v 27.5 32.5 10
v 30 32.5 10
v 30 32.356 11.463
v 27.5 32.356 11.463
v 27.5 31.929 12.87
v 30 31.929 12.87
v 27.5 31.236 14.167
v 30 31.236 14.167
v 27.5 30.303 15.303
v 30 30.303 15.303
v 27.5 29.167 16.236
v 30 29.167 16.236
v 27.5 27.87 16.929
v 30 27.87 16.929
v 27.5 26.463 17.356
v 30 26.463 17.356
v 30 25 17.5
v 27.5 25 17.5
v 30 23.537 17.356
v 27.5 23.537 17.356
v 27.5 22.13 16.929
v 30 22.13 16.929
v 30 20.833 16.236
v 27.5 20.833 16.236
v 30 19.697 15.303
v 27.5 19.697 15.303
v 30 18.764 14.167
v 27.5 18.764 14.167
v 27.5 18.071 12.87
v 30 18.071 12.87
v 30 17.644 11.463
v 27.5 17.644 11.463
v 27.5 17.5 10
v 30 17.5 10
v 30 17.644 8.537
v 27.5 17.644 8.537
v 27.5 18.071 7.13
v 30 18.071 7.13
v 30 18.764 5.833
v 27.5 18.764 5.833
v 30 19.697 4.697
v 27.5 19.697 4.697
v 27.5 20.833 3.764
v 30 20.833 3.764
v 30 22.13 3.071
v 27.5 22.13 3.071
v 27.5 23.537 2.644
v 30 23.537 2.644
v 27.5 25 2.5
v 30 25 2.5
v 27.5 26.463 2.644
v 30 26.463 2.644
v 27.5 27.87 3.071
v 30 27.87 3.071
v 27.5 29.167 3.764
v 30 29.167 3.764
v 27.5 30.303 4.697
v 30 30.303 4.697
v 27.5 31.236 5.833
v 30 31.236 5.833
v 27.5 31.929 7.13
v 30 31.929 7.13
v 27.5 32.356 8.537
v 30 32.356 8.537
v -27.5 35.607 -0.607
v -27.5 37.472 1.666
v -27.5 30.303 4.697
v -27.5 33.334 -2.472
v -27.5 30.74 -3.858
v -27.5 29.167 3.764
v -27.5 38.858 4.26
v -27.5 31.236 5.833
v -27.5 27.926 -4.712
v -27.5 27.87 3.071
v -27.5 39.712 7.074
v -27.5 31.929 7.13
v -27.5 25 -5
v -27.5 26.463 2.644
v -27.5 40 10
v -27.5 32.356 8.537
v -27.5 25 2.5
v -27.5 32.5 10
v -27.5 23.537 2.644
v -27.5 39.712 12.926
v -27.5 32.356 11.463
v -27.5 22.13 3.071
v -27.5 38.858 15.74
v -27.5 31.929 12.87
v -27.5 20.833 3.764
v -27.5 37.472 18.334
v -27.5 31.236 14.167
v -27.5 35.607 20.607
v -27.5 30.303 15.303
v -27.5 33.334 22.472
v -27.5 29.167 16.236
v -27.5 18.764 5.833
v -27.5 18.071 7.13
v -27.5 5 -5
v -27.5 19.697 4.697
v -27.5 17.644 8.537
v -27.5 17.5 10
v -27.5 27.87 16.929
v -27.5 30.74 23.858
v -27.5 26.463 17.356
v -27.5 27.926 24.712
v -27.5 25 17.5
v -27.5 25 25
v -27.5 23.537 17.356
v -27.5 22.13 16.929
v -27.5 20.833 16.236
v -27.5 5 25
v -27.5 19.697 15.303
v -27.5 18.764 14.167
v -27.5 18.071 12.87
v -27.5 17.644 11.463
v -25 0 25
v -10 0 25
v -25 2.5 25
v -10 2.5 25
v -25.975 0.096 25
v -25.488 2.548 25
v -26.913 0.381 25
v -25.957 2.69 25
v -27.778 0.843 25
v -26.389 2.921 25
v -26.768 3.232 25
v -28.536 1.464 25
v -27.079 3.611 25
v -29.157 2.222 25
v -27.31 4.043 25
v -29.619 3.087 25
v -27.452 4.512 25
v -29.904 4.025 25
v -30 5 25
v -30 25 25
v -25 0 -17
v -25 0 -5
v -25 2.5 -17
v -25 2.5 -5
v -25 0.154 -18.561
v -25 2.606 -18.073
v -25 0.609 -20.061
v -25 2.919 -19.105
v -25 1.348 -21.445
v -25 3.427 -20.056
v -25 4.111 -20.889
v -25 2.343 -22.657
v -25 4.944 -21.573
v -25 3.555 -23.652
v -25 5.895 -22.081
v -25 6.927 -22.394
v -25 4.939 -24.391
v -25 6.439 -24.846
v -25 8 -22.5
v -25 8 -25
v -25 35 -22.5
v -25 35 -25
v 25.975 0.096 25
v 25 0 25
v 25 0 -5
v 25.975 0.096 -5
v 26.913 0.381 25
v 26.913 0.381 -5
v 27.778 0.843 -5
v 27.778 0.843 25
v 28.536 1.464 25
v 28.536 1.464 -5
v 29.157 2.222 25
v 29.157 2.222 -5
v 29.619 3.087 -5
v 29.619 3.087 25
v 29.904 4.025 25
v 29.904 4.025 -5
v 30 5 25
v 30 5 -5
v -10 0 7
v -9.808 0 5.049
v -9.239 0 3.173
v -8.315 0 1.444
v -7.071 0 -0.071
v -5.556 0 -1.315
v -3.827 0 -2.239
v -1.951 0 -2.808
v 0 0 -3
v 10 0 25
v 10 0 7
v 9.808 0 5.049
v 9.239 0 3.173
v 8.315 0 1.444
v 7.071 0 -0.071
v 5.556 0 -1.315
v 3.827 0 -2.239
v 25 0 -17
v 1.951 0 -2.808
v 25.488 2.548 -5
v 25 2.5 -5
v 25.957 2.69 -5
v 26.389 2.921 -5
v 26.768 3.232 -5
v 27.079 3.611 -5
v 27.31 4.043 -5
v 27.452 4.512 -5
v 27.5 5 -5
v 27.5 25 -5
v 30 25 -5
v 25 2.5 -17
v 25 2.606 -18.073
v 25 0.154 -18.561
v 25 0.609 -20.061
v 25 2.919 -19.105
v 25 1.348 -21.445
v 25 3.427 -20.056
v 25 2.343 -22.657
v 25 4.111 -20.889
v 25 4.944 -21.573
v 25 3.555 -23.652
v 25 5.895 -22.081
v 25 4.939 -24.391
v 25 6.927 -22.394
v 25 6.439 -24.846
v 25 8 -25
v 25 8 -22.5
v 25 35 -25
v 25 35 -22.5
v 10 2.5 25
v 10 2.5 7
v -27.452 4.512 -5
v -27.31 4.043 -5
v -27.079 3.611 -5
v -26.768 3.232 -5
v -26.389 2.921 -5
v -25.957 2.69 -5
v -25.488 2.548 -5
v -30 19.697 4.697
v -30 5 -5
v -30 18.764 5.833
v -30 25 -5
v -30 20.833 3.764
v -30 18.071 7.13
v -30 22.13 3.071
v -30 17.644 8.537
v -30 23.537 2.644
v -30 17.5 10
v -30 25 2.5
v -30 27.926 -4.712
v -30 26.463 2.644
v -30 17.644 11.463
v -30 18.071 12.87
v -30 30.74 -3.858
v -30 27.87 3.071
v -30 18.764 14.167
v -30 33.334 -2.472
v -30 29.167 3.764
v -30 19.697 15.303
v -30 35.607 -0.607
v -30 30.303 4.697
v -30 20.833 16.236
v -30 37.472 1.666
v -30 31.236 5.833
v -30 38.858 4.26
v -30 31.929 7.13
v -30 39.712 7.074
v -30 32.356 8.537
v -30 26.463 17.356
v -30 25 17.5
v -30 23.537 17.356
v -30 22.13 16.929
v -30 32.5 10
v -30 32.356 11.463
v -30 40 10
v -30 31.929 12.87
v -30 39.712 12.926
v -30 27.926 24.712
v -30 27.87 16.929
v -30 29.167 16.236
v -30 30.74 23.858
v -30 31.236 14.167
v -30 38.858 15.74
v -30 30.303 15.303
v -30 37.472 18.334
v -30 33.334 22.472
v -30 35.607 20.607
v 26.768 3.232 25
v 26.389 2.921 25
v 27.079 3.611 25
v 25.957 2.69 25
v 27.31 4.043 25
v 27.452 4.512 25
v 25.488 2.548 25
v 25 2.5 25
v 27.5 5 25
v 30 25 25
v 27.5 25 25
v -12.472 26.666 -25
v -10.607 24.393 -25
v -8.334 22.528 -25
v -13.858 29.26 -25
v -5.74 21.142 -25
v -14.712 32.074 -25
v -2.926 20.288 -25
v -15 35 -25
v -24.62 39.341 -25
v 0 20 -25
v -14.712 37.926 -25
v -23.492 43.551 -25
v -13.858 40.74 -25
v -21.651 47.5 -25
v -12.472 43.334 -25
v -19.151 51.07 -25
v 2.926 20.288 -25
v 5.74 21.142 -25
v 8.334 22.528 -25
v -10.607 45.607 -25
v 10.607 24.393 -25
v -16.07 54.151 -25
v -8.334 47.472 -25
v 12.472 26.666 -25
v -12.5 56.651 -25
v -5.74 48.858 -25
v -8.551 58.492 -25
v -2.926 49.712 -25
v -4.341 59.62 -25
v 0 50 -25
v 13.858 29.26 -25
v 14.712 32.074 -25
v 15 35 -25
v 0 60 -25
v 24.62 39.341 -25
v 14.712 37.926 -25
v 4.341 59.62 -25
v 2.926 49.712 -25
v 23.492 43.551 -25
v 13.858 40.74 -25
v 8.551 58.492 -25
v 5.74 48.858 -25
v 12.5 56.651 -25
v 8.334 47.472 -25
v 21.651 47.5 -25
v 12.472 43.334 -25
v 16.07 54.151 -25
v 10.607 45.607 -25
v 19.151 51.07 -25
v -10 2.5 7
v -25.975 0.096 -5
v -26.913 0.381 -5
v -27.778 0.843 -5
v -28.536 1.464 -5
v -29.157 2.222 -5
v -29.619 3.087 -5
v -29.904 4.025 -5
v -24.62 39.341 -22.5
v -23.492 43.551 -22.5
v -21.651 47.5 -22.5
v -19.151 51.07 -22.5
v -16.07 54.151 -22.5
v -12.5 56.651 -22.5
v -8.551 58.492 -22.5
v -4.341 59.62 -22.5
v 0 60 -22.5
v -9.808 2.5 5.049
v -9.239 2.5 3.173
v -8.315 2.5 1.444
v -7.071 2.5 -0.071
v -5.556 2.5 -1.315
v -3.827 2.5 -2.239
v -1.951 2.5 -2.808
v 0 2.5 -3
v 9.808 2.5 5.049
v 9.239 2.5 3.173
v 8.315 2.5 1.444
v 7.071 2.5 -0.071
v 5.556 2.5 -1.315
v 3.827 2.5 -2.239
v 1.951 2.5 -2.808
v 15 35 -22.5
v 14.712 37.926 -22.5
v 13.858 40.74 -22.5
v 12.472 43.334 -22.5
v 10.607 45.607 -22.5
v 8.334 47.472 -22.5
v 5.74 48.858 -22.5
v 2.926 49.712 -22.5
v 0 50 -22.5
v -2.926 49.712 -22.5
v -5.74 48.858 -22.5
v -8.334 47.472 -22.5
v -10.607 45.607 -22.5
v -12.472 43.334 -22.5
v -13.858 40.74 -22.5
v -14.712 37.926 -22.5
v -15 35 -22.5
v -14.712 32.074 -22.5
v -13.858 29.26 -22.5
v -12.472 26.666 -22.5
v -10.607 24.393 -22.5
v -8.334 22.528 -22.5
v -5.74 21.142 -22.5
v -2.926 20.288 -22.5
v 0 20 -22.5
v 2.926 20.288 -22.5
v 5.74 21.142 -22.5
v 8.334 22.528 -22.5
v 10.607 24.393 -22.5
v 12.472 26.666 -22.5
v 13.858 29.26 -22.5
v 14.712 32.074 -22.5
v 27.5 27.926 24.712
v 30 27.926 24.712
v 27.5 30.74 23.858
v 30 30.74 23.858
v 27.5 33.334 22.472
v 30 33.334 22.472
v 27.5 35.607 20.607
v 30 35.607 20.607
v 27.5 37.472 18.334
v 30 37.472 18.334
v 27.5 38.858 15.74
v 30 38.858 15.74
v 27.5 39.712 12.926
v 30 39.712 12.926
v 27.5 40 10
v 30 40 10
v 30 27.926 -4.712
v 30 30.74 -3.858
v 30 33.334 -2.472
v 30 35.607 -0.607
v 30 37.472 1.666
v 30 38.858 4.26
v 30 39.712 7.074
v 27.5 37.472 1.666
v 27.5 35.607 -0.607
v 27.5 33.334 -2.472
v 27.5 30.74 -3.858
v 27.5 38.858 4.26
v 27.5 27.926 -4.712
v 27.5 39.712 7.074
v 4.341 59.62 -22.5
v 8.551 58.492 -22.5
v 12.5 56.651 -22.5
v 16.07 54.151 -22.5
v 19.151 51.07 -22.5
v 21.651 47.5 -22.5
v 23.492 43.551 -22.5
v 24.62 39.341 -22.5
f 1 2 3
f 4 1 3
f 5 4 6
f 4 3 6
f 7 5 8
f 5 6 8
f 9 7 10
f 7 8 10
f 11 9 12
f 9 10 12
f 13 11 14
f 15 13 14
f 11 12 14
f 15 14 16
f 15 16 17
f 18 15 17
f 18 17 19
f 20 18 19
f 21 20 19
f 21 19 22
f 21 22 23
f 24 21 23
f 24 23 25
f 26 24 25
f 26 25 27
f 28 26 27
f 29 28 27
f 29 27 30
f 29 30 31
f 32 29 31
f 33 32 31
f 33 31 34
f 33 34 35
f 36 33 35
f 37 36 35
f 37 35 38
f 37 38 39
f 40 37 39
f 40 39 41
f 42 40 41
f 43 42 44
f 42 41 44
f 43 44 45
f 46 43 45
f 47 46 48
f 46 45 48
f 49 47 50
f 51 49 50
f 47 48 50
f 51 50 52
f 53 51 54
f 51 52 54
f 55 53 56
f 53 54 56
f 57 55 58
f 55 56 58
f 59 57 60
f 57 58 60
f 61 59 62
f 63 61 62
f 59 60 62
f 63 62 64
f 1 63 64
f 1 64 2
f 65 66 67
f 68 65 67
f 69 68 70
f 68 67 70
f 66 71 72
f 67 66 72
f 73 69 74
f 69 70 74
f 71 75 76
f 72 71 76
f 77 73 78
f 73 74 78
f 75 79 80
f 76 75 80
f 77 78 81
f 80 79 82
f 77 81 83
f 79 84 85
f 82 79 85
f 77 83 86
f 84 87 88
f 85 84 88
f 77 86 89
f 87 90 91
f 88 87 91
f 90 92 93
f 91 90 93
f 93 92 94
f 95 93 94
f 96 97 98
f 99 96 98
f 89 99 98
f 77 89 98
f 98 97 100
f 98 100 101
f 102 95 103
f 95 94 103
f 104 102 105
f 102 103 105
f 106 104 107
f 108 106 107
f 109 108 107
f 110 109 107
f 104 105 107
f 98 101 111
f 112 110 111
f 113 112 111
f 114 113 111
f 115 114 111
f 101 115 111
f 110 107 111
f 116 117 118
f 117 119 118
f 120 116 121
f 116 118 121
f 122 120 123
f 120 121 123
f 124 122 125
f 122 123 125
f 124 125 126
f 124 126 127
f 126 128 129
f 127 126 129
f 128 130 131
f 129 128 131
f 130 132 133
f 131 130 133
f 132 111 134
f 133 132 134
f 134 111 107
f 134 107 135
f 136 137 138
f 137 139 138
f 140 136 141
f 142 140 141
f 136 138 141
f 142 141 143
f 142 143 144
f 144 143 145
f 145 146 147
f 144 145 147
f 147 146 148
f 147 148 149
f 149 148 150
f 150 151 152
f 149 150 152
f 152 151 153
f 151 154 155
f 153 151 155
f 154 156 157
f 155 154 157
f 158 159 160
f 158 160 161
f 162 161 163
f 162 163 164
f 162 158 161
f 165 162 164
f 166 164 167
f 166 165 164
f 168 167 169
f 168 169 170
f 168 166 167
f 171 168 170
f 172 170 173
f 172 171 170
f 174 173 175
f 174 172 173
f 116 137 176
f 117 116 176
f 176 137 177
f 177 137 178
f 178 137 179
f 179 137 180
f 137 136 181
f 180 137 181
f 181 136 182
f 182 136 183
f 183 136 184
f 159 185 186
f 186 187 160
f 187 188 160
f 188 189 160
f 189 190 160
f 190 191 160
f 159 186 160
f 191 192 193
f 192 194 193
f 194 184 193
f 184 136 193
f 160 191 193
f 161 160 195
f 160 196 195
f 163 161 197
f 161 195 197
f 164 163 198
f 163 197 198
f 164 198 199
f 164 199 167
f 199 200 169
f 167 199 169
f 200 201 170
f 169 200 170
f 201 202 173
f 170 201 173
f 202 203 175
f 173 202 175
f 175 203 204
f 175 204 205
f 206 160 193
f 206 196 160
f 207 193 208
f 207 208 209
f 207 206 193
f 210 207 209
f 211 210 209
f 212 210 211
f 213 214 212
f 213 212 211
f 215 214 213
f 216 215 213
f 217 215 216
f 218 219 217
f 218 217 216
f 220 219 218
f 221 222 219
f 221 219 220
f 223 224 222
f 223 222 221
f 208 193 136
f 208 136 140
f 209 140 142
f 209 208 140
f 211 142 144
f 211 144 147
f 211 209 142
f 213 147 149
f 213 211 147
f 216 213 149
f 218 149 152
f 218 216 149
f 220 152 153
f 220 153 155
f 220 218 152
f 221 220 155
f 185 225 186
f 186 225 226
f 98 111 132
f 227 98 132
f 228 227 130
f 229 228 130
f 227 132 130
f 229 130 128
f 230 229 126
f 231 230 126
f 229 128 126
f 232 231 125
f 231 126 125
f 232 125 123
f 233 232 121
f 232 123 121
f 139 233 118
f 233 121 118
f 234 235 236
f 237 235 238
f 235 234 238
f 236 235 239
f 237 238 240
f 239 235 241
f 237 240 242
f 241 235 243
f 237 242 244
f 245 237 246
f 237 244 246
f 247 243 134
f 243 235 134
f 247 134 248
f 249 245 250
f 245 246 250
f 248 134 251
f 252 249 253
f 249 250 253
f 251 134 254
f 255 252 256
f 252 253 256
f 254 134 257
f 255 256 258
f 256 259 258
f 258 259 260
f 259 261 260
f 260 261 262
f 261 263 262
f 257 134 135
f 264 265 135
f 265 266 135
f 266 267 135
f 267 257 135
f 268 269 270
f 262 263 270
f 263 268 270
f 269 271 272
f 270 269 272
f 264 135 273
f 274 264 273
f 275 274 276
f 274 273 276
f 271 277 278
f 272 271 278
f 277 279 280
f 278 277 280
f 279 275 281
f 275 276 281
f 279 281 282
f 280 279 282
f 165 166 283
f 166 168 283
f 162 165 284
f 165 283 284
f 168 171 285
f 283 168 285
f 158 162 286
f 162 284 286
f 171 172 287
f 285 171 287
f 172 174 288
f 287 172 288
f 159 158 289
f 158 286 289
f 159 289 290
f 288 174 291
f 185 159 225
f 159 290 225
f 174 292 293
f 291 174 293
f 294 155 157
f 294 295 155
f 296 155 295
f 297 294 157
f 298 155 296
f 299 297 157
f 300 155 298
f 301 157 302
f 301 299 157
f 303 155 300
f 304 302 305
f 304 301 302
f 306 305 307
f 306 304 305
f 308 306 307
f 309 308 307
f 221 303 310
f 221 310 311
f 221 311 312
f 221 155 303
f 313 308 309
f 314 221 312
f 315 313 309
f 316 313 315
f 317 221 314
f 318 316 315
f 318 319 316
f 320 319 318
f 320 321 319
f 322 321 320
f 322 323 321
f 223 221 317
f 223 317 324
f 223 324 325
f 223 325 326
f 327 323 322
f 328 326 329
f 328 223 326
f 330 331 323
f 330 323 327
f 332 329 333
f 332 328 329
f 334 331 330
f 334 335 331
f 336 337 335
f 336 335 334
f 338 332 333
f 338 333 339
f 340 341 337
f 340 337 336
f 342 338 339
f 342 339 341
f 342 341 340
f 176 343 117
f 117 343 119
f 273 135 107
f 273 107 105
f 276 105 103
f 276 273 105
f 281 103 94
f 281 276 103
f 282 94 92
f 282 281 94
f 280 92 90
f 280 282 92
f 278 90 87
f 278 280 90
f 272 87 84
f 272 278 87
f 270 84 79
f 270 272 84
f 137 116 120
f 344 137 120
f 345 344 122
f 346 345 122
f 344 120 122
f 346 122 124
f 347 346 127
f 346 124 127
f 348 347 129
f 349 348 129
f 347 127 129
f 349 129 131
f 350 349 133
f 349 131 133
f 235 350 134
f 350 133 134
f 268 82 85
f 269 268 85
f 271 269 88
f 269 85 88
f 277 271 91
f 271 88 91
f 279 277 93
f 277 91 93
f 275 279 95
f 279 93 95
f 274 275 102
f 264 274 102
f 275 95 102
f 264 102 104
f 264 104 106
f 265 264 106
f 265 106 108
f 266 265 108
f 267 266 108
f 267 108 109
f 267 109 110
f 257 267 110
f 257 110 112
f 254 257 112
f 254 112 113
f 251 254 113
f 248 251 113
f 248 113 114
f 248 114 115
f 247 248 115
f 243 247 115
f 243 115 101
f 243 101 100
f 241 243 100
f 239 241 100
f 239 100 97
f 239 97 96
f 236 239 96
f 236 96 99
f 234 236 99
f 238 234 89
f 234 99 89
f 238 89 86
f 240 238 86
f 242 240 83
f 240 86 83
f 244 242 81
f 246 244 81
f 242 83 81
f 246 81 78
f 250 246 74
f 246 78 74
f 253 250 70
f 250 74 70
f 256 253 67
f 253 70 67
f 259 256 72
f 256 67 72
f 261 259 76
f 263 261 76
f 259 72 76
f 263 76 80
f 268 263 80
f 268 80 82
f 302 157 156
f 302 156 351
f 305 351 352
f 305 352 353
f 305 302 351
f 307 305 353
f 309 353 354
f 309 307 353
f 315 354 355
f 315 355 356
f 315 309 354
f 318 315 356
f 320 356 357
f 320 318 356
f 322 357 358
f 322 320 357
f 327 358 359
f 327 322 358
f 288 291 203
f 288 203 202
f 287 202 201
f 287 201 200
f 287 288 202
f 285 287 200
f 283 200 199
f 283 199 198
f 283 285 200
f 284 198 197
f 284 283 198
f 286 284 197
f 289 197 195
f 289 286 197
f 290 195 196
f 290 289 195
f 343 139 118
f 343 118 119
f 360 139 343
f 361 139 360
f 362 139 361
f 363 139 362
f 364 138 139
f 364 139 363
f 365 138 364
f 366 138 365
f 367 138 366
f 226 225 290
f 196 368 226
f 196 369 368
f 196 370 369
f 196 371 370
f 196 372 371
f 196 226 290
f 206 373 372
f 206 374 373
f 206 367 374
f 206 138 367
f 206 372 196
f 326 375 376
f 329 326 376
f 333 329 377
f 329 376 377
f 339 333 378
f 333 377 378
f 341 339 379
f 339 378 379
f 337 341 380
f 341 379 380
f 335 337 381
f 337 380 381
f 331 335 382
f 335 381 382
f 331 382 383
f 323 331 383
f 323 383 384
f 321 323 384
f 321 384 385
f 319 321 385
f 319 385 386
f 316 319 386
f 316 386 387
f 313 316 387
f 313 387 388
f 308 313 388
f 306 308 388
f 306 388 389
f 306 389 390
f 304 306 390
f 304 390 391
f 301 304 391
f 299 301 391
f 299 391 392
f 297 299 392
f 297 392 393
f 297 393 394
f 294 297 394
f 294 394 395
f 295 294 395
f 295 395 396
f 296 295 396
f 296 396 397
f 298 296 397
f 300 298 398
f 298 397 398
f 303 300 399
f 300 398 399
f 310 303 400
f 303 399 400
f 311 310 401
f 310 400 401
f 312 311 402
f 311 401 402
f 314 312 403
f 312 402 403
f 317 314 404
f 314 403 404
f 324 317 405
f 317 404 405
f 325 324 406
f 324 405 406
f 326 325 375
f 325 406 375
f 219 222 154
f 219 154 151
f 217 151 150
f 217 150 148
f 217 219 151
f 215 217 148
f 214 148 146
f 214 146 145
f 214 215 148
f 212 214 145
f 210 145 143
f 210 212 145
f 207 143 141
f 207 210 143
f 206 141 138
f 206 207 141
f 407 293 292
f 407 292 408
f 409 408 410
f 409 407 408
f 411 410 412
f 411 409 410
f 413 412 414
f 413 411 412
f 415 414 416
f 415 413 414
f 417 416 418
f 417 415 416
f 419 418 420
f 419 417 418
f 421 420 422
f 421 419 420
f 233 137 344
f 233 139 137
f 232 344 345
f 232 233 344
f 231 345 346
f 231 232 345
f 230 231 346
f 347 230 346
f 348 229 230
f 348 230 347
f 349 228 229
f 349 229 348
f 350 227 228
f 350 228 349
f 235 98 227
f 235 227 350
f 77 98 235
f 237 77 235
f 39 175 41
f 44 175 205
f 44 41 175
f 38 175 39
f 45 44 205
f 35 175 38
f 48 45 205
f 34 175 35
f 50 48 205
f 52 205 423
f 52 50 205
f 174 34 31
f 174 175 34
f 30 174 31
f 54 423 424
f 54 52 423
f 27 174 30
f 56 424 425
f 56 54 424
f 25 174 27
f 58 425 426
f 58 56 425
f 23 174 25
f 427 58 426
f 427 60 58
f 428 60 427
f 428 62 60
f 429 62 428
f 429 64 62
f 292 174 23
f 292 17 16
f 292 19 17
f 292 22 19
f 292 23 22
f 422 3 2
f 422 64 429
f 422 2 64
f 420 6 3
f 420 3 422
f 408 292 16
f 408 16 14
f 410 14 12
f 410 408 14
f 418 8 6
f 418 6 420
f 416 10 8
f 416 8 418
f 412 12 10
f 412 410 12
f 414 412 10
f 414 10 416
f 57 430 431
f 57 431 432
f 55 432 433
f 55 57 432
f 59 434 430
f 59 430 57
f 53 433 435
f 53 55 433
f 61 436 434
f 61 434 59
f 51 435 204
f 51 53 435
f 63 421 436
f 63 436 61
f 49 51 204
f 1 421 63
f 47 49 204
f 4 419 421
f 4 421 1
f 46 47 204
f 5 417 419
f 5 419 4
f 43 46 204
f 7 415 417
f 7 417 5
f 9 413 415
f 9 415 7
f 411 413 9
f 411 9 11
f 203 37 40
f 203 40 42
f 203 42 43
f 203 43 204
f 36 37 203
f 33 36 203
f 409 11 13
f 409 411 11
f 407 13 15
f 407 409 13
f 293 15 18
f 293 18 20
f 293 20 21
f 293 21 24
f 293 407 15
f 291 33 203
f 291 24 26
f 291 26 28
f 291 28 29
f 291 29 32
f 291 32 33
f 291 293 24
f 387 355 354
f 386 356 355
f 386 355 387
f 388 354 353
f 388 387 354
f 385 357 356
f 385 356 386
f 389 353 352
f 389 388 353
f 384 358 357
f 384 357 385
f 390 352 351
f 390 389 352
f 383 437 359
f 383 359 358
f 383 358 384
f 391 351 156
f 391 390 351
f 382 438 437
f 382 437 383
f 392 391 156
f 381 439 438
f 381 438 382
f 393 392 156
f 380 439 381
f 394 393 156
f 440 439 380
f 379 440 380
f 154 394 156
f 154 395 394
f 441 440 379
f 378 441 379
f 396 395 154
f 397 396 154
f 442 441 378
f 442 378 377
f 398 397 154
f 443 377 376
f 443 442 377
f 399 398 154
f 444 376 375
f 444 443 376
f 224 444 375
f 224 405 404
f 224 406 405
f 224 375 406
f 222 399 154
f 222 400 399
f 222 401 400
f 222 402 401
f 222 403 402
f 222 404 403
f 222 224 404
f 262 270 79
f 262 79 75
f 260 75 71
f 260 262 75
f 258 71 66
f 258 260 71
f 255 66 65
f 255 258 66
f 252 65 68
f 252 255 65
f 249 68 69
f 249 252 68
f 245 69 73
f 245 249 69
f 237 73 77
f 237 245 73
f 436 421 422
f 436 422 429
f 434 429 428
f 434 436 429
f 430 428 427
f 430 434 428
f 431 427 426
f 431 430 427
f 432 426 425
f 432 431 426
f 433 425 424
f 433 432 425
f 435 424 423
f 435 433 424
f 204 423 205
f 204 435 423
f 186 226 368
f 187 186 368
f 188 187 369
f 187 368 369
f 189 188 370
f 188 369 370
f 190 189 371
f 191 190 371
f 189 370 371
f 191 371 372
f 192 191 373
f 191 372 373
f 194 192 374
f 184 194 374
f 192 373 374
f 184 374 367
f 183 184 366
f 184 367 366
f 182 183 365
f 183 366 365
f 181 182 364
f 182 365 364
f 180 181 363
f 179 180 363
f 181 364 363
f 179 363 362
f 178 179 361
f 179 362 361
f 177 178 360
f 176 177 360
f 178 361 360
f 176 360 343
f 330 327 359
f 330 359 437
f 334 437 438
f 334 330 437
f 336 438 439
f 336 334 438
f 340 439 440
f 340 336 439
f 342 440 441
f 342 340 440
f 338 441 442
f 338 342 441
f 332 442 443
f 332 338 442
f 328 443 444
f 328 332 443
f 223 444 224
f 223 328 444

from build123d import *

# Parameters (mm, degrees)
SKETCH1_W                    = 50
SKETCH1_H                    = 50
BASE_FLANGE1_DEPTH           = 2.5
EDGE_FLANGE2_STRIP_W         = 21
EDGE_FLANGE2_STRIP_H         = 2.5
EDGE_FLANGE2_STRIP_CUT_DEPTH = 50
EDGE_FLANGE2_DEPTH           = 50
BREAK_CORNER2_START          = -25
BREAK_CORNER2_DEPTH          = 2.5
EDGE_FLANGE4_DEPTH           = 30
SKETCH29_R                   = 15
CUT_EXTRUDE1_DEPTH           = 10
CUT_EXTRUDE2_DEPTH           = 10
BREAK_CORNER3_START          = -30
BREAK_CORNER3_DEPTH          = 60
SKETCH31_R                   = 7.5
CUT_EXTRUDE3_DEPTH           = 72


# Read off the part's stored shape, not the designer's step: Break-Corner2, Break-Corner3
# Sheet-metal steps are written as plain solids
with BuildPart() as part:
    # Sketch1 → Base-Flange1 (new body)
    with BuildSketch(Plane(origin=(0, 0, 0), x_dir=(1, 0, 0), z_dir=(0, 1, 0))):
        Rectangle(SKETCH1_W, SKETCH1_H)
    extrude(amount=BASE_FLANGE1_DEPTH)

    # Edge-Flange2 strip (across the edge) → Edge-Flange2 strip cut (cut)
    with BuildSketch(Plane(origin=(25, 2.5, -25), x_dir=(0, 0, 1), z_dir=(-1, 0, 0))):
        with Locations((-2.5, -1.25)):
            Rectangle(EDGE_FLANGE2_STRIP_W, EDGE_FLANGE2_STRIP_H)
    extrude(amount=EDGE_FLANGE2_STRIP_CUT_DEPTH, mode=Mode.SUBTRACT)

    # Edge-Flange2 section (across the edge) → Edge-Flange2 (add)
    with BuildSketch(Plane(origin=(25, 2.5, -25), x_dir=(0, 0, 1), z_dir=(-1, 0, 0))):
        with BuildLine():
            Line((0, 5.5), (0, 57.5))
            Line((0, 57.5), (2.5, 57.5))
            Line((2.5, 57.5), (2.5, 5.5))
            ThreePointArc((2.5, 5.5), (4.110912703, 1.610912703), (8, 0))
            Line((8, 0), (8, -2.5))
            ThreePointArc((8, -2.5), (2.343145751, -0.156854249), (0, 5.5))
        make_face()
    extrude(amount=EDGE_FLANGE2_DEPTH)

    # Break-Corner2 outline → Break-Corner2 (cut)
    with BuildSketch(Plane.XY.offset(BREAK_CORNER2_START)):
        with BuildLine():
            ThreePointArc((-25, 35), (-17.67766953, 52.67766953), (0, 60))
            Line((0, 60), (-25, 60))
            Line((-25, 60), (-25, 35))
        make_face()
        with BuildLine():
            ThreePointArc((0, 60), (17.67766953, 52.67766953), (25, 35))
            Line((25, 35), (25, 60))
            Line((25, 60), (0, 60))
        make_face()
    extrude(amount=BREAK_CORNER2_DEPTH, mode=Mode.SUBTRACT)

    # Edge-Flange4 section (across the edge) → Edge-Flange4 (add)
    with BuildSketch(Plane(origin=(27.5, 2.5, 25), x_dir=(-1, 0, 0), z_dir=(0, 0, -1))):
        with BuildLine():
            Line((-2.5, 2.5), (-2.5, 37.5))
            Line((-2.5, 37.5), (0, 37.5))
            Line((0, 37.5), (0, 2.5))
            ThreePointArc((0, 2.5), (0.732233047, 0.732233047), (2.5, 0))
            Line((2.5, 0), (2.5, -2.5))
            ThreePointArc((2.5, -2.5), (-1.035533906, -1.035533906), (-2.5, 2.5))
        make_face()
    edge_flange4 = extrude(amount=EDGE_FLANGE4_DEPTH)

    # Mirror1: Edge-Flange4 across plane
    add(edge_flange4.mirror(Plane(origin=(0, 0, 0), x_dir=(0, 0, 1), z_dir=(1, 0, 0))))

    # Sketch29 → Cut-Extrude1 (cut)
    with BuildSketch(Plane.XY.offset(-22.5)):
        with Locations((0, 35)):
            Circle(SKETCH29_R)
    extrude(amount=-CUT_EXTRUDE1_DEPTH, mode=Mode.SUBTRACT)

    # Sketch30 → Cut-Extrude2 (cut)
    with BuildSketch(Plane(origin=(0, 2.5, 0), x_dir=(1, 0, 0), z_dir=(0, 1, 0))):
        with BuildLine():
            Line((-10, -43), (10, -43))
            Line((10, -43), (10, -7))
            ThreePointArc((10, -7), (0, 3), (-10, -7))
            Line((-10, -7), (-10, -43))
        make_face()
    extrude(amount=-CUT_EXTRUDE2_DEPTH, mode=Mode.SUBTRACT)

    # Break-Corner3 outline → Break-Corner3 (cut)
    with BuildSketch(Plane.YZ.offset(BREAK_CORNER3_START)):
        with BuildLine():
            Line((40, -5), (40, 10))
            ThreePointArc((40, 10), (35.606601718, -0.606601718), (25, -5))
            Line((25, -5), (40, -5))
        make_face()
        with BuildLine():
            ThreePointArc((25, 25), (35.606601718, 20.606601718), (40, 10))
            Line((40, 10), (40, 25))
            Line((40, 25), (25, 25))
        make_face()
    extrude(amount=BREAK_CORNER3_DEPTH, mode=Mode.SUBTRACT)

    # Sketch31 → Cut-Extrude3 (cut)
    with BuildSketch(Plane(origin=(30, 0, 0), x_dir=(0, 0, -1), z_dir=(1, 0, 0))):
        with Locations(Location((-10, 25, 0), (0, 0, 90))):
            Circle(SKETCH31_R)
    extrude(amount=-CUT_EXTRUDE3_DEPTH, mode=Mode.SUBTRACT)


solid = part.part
